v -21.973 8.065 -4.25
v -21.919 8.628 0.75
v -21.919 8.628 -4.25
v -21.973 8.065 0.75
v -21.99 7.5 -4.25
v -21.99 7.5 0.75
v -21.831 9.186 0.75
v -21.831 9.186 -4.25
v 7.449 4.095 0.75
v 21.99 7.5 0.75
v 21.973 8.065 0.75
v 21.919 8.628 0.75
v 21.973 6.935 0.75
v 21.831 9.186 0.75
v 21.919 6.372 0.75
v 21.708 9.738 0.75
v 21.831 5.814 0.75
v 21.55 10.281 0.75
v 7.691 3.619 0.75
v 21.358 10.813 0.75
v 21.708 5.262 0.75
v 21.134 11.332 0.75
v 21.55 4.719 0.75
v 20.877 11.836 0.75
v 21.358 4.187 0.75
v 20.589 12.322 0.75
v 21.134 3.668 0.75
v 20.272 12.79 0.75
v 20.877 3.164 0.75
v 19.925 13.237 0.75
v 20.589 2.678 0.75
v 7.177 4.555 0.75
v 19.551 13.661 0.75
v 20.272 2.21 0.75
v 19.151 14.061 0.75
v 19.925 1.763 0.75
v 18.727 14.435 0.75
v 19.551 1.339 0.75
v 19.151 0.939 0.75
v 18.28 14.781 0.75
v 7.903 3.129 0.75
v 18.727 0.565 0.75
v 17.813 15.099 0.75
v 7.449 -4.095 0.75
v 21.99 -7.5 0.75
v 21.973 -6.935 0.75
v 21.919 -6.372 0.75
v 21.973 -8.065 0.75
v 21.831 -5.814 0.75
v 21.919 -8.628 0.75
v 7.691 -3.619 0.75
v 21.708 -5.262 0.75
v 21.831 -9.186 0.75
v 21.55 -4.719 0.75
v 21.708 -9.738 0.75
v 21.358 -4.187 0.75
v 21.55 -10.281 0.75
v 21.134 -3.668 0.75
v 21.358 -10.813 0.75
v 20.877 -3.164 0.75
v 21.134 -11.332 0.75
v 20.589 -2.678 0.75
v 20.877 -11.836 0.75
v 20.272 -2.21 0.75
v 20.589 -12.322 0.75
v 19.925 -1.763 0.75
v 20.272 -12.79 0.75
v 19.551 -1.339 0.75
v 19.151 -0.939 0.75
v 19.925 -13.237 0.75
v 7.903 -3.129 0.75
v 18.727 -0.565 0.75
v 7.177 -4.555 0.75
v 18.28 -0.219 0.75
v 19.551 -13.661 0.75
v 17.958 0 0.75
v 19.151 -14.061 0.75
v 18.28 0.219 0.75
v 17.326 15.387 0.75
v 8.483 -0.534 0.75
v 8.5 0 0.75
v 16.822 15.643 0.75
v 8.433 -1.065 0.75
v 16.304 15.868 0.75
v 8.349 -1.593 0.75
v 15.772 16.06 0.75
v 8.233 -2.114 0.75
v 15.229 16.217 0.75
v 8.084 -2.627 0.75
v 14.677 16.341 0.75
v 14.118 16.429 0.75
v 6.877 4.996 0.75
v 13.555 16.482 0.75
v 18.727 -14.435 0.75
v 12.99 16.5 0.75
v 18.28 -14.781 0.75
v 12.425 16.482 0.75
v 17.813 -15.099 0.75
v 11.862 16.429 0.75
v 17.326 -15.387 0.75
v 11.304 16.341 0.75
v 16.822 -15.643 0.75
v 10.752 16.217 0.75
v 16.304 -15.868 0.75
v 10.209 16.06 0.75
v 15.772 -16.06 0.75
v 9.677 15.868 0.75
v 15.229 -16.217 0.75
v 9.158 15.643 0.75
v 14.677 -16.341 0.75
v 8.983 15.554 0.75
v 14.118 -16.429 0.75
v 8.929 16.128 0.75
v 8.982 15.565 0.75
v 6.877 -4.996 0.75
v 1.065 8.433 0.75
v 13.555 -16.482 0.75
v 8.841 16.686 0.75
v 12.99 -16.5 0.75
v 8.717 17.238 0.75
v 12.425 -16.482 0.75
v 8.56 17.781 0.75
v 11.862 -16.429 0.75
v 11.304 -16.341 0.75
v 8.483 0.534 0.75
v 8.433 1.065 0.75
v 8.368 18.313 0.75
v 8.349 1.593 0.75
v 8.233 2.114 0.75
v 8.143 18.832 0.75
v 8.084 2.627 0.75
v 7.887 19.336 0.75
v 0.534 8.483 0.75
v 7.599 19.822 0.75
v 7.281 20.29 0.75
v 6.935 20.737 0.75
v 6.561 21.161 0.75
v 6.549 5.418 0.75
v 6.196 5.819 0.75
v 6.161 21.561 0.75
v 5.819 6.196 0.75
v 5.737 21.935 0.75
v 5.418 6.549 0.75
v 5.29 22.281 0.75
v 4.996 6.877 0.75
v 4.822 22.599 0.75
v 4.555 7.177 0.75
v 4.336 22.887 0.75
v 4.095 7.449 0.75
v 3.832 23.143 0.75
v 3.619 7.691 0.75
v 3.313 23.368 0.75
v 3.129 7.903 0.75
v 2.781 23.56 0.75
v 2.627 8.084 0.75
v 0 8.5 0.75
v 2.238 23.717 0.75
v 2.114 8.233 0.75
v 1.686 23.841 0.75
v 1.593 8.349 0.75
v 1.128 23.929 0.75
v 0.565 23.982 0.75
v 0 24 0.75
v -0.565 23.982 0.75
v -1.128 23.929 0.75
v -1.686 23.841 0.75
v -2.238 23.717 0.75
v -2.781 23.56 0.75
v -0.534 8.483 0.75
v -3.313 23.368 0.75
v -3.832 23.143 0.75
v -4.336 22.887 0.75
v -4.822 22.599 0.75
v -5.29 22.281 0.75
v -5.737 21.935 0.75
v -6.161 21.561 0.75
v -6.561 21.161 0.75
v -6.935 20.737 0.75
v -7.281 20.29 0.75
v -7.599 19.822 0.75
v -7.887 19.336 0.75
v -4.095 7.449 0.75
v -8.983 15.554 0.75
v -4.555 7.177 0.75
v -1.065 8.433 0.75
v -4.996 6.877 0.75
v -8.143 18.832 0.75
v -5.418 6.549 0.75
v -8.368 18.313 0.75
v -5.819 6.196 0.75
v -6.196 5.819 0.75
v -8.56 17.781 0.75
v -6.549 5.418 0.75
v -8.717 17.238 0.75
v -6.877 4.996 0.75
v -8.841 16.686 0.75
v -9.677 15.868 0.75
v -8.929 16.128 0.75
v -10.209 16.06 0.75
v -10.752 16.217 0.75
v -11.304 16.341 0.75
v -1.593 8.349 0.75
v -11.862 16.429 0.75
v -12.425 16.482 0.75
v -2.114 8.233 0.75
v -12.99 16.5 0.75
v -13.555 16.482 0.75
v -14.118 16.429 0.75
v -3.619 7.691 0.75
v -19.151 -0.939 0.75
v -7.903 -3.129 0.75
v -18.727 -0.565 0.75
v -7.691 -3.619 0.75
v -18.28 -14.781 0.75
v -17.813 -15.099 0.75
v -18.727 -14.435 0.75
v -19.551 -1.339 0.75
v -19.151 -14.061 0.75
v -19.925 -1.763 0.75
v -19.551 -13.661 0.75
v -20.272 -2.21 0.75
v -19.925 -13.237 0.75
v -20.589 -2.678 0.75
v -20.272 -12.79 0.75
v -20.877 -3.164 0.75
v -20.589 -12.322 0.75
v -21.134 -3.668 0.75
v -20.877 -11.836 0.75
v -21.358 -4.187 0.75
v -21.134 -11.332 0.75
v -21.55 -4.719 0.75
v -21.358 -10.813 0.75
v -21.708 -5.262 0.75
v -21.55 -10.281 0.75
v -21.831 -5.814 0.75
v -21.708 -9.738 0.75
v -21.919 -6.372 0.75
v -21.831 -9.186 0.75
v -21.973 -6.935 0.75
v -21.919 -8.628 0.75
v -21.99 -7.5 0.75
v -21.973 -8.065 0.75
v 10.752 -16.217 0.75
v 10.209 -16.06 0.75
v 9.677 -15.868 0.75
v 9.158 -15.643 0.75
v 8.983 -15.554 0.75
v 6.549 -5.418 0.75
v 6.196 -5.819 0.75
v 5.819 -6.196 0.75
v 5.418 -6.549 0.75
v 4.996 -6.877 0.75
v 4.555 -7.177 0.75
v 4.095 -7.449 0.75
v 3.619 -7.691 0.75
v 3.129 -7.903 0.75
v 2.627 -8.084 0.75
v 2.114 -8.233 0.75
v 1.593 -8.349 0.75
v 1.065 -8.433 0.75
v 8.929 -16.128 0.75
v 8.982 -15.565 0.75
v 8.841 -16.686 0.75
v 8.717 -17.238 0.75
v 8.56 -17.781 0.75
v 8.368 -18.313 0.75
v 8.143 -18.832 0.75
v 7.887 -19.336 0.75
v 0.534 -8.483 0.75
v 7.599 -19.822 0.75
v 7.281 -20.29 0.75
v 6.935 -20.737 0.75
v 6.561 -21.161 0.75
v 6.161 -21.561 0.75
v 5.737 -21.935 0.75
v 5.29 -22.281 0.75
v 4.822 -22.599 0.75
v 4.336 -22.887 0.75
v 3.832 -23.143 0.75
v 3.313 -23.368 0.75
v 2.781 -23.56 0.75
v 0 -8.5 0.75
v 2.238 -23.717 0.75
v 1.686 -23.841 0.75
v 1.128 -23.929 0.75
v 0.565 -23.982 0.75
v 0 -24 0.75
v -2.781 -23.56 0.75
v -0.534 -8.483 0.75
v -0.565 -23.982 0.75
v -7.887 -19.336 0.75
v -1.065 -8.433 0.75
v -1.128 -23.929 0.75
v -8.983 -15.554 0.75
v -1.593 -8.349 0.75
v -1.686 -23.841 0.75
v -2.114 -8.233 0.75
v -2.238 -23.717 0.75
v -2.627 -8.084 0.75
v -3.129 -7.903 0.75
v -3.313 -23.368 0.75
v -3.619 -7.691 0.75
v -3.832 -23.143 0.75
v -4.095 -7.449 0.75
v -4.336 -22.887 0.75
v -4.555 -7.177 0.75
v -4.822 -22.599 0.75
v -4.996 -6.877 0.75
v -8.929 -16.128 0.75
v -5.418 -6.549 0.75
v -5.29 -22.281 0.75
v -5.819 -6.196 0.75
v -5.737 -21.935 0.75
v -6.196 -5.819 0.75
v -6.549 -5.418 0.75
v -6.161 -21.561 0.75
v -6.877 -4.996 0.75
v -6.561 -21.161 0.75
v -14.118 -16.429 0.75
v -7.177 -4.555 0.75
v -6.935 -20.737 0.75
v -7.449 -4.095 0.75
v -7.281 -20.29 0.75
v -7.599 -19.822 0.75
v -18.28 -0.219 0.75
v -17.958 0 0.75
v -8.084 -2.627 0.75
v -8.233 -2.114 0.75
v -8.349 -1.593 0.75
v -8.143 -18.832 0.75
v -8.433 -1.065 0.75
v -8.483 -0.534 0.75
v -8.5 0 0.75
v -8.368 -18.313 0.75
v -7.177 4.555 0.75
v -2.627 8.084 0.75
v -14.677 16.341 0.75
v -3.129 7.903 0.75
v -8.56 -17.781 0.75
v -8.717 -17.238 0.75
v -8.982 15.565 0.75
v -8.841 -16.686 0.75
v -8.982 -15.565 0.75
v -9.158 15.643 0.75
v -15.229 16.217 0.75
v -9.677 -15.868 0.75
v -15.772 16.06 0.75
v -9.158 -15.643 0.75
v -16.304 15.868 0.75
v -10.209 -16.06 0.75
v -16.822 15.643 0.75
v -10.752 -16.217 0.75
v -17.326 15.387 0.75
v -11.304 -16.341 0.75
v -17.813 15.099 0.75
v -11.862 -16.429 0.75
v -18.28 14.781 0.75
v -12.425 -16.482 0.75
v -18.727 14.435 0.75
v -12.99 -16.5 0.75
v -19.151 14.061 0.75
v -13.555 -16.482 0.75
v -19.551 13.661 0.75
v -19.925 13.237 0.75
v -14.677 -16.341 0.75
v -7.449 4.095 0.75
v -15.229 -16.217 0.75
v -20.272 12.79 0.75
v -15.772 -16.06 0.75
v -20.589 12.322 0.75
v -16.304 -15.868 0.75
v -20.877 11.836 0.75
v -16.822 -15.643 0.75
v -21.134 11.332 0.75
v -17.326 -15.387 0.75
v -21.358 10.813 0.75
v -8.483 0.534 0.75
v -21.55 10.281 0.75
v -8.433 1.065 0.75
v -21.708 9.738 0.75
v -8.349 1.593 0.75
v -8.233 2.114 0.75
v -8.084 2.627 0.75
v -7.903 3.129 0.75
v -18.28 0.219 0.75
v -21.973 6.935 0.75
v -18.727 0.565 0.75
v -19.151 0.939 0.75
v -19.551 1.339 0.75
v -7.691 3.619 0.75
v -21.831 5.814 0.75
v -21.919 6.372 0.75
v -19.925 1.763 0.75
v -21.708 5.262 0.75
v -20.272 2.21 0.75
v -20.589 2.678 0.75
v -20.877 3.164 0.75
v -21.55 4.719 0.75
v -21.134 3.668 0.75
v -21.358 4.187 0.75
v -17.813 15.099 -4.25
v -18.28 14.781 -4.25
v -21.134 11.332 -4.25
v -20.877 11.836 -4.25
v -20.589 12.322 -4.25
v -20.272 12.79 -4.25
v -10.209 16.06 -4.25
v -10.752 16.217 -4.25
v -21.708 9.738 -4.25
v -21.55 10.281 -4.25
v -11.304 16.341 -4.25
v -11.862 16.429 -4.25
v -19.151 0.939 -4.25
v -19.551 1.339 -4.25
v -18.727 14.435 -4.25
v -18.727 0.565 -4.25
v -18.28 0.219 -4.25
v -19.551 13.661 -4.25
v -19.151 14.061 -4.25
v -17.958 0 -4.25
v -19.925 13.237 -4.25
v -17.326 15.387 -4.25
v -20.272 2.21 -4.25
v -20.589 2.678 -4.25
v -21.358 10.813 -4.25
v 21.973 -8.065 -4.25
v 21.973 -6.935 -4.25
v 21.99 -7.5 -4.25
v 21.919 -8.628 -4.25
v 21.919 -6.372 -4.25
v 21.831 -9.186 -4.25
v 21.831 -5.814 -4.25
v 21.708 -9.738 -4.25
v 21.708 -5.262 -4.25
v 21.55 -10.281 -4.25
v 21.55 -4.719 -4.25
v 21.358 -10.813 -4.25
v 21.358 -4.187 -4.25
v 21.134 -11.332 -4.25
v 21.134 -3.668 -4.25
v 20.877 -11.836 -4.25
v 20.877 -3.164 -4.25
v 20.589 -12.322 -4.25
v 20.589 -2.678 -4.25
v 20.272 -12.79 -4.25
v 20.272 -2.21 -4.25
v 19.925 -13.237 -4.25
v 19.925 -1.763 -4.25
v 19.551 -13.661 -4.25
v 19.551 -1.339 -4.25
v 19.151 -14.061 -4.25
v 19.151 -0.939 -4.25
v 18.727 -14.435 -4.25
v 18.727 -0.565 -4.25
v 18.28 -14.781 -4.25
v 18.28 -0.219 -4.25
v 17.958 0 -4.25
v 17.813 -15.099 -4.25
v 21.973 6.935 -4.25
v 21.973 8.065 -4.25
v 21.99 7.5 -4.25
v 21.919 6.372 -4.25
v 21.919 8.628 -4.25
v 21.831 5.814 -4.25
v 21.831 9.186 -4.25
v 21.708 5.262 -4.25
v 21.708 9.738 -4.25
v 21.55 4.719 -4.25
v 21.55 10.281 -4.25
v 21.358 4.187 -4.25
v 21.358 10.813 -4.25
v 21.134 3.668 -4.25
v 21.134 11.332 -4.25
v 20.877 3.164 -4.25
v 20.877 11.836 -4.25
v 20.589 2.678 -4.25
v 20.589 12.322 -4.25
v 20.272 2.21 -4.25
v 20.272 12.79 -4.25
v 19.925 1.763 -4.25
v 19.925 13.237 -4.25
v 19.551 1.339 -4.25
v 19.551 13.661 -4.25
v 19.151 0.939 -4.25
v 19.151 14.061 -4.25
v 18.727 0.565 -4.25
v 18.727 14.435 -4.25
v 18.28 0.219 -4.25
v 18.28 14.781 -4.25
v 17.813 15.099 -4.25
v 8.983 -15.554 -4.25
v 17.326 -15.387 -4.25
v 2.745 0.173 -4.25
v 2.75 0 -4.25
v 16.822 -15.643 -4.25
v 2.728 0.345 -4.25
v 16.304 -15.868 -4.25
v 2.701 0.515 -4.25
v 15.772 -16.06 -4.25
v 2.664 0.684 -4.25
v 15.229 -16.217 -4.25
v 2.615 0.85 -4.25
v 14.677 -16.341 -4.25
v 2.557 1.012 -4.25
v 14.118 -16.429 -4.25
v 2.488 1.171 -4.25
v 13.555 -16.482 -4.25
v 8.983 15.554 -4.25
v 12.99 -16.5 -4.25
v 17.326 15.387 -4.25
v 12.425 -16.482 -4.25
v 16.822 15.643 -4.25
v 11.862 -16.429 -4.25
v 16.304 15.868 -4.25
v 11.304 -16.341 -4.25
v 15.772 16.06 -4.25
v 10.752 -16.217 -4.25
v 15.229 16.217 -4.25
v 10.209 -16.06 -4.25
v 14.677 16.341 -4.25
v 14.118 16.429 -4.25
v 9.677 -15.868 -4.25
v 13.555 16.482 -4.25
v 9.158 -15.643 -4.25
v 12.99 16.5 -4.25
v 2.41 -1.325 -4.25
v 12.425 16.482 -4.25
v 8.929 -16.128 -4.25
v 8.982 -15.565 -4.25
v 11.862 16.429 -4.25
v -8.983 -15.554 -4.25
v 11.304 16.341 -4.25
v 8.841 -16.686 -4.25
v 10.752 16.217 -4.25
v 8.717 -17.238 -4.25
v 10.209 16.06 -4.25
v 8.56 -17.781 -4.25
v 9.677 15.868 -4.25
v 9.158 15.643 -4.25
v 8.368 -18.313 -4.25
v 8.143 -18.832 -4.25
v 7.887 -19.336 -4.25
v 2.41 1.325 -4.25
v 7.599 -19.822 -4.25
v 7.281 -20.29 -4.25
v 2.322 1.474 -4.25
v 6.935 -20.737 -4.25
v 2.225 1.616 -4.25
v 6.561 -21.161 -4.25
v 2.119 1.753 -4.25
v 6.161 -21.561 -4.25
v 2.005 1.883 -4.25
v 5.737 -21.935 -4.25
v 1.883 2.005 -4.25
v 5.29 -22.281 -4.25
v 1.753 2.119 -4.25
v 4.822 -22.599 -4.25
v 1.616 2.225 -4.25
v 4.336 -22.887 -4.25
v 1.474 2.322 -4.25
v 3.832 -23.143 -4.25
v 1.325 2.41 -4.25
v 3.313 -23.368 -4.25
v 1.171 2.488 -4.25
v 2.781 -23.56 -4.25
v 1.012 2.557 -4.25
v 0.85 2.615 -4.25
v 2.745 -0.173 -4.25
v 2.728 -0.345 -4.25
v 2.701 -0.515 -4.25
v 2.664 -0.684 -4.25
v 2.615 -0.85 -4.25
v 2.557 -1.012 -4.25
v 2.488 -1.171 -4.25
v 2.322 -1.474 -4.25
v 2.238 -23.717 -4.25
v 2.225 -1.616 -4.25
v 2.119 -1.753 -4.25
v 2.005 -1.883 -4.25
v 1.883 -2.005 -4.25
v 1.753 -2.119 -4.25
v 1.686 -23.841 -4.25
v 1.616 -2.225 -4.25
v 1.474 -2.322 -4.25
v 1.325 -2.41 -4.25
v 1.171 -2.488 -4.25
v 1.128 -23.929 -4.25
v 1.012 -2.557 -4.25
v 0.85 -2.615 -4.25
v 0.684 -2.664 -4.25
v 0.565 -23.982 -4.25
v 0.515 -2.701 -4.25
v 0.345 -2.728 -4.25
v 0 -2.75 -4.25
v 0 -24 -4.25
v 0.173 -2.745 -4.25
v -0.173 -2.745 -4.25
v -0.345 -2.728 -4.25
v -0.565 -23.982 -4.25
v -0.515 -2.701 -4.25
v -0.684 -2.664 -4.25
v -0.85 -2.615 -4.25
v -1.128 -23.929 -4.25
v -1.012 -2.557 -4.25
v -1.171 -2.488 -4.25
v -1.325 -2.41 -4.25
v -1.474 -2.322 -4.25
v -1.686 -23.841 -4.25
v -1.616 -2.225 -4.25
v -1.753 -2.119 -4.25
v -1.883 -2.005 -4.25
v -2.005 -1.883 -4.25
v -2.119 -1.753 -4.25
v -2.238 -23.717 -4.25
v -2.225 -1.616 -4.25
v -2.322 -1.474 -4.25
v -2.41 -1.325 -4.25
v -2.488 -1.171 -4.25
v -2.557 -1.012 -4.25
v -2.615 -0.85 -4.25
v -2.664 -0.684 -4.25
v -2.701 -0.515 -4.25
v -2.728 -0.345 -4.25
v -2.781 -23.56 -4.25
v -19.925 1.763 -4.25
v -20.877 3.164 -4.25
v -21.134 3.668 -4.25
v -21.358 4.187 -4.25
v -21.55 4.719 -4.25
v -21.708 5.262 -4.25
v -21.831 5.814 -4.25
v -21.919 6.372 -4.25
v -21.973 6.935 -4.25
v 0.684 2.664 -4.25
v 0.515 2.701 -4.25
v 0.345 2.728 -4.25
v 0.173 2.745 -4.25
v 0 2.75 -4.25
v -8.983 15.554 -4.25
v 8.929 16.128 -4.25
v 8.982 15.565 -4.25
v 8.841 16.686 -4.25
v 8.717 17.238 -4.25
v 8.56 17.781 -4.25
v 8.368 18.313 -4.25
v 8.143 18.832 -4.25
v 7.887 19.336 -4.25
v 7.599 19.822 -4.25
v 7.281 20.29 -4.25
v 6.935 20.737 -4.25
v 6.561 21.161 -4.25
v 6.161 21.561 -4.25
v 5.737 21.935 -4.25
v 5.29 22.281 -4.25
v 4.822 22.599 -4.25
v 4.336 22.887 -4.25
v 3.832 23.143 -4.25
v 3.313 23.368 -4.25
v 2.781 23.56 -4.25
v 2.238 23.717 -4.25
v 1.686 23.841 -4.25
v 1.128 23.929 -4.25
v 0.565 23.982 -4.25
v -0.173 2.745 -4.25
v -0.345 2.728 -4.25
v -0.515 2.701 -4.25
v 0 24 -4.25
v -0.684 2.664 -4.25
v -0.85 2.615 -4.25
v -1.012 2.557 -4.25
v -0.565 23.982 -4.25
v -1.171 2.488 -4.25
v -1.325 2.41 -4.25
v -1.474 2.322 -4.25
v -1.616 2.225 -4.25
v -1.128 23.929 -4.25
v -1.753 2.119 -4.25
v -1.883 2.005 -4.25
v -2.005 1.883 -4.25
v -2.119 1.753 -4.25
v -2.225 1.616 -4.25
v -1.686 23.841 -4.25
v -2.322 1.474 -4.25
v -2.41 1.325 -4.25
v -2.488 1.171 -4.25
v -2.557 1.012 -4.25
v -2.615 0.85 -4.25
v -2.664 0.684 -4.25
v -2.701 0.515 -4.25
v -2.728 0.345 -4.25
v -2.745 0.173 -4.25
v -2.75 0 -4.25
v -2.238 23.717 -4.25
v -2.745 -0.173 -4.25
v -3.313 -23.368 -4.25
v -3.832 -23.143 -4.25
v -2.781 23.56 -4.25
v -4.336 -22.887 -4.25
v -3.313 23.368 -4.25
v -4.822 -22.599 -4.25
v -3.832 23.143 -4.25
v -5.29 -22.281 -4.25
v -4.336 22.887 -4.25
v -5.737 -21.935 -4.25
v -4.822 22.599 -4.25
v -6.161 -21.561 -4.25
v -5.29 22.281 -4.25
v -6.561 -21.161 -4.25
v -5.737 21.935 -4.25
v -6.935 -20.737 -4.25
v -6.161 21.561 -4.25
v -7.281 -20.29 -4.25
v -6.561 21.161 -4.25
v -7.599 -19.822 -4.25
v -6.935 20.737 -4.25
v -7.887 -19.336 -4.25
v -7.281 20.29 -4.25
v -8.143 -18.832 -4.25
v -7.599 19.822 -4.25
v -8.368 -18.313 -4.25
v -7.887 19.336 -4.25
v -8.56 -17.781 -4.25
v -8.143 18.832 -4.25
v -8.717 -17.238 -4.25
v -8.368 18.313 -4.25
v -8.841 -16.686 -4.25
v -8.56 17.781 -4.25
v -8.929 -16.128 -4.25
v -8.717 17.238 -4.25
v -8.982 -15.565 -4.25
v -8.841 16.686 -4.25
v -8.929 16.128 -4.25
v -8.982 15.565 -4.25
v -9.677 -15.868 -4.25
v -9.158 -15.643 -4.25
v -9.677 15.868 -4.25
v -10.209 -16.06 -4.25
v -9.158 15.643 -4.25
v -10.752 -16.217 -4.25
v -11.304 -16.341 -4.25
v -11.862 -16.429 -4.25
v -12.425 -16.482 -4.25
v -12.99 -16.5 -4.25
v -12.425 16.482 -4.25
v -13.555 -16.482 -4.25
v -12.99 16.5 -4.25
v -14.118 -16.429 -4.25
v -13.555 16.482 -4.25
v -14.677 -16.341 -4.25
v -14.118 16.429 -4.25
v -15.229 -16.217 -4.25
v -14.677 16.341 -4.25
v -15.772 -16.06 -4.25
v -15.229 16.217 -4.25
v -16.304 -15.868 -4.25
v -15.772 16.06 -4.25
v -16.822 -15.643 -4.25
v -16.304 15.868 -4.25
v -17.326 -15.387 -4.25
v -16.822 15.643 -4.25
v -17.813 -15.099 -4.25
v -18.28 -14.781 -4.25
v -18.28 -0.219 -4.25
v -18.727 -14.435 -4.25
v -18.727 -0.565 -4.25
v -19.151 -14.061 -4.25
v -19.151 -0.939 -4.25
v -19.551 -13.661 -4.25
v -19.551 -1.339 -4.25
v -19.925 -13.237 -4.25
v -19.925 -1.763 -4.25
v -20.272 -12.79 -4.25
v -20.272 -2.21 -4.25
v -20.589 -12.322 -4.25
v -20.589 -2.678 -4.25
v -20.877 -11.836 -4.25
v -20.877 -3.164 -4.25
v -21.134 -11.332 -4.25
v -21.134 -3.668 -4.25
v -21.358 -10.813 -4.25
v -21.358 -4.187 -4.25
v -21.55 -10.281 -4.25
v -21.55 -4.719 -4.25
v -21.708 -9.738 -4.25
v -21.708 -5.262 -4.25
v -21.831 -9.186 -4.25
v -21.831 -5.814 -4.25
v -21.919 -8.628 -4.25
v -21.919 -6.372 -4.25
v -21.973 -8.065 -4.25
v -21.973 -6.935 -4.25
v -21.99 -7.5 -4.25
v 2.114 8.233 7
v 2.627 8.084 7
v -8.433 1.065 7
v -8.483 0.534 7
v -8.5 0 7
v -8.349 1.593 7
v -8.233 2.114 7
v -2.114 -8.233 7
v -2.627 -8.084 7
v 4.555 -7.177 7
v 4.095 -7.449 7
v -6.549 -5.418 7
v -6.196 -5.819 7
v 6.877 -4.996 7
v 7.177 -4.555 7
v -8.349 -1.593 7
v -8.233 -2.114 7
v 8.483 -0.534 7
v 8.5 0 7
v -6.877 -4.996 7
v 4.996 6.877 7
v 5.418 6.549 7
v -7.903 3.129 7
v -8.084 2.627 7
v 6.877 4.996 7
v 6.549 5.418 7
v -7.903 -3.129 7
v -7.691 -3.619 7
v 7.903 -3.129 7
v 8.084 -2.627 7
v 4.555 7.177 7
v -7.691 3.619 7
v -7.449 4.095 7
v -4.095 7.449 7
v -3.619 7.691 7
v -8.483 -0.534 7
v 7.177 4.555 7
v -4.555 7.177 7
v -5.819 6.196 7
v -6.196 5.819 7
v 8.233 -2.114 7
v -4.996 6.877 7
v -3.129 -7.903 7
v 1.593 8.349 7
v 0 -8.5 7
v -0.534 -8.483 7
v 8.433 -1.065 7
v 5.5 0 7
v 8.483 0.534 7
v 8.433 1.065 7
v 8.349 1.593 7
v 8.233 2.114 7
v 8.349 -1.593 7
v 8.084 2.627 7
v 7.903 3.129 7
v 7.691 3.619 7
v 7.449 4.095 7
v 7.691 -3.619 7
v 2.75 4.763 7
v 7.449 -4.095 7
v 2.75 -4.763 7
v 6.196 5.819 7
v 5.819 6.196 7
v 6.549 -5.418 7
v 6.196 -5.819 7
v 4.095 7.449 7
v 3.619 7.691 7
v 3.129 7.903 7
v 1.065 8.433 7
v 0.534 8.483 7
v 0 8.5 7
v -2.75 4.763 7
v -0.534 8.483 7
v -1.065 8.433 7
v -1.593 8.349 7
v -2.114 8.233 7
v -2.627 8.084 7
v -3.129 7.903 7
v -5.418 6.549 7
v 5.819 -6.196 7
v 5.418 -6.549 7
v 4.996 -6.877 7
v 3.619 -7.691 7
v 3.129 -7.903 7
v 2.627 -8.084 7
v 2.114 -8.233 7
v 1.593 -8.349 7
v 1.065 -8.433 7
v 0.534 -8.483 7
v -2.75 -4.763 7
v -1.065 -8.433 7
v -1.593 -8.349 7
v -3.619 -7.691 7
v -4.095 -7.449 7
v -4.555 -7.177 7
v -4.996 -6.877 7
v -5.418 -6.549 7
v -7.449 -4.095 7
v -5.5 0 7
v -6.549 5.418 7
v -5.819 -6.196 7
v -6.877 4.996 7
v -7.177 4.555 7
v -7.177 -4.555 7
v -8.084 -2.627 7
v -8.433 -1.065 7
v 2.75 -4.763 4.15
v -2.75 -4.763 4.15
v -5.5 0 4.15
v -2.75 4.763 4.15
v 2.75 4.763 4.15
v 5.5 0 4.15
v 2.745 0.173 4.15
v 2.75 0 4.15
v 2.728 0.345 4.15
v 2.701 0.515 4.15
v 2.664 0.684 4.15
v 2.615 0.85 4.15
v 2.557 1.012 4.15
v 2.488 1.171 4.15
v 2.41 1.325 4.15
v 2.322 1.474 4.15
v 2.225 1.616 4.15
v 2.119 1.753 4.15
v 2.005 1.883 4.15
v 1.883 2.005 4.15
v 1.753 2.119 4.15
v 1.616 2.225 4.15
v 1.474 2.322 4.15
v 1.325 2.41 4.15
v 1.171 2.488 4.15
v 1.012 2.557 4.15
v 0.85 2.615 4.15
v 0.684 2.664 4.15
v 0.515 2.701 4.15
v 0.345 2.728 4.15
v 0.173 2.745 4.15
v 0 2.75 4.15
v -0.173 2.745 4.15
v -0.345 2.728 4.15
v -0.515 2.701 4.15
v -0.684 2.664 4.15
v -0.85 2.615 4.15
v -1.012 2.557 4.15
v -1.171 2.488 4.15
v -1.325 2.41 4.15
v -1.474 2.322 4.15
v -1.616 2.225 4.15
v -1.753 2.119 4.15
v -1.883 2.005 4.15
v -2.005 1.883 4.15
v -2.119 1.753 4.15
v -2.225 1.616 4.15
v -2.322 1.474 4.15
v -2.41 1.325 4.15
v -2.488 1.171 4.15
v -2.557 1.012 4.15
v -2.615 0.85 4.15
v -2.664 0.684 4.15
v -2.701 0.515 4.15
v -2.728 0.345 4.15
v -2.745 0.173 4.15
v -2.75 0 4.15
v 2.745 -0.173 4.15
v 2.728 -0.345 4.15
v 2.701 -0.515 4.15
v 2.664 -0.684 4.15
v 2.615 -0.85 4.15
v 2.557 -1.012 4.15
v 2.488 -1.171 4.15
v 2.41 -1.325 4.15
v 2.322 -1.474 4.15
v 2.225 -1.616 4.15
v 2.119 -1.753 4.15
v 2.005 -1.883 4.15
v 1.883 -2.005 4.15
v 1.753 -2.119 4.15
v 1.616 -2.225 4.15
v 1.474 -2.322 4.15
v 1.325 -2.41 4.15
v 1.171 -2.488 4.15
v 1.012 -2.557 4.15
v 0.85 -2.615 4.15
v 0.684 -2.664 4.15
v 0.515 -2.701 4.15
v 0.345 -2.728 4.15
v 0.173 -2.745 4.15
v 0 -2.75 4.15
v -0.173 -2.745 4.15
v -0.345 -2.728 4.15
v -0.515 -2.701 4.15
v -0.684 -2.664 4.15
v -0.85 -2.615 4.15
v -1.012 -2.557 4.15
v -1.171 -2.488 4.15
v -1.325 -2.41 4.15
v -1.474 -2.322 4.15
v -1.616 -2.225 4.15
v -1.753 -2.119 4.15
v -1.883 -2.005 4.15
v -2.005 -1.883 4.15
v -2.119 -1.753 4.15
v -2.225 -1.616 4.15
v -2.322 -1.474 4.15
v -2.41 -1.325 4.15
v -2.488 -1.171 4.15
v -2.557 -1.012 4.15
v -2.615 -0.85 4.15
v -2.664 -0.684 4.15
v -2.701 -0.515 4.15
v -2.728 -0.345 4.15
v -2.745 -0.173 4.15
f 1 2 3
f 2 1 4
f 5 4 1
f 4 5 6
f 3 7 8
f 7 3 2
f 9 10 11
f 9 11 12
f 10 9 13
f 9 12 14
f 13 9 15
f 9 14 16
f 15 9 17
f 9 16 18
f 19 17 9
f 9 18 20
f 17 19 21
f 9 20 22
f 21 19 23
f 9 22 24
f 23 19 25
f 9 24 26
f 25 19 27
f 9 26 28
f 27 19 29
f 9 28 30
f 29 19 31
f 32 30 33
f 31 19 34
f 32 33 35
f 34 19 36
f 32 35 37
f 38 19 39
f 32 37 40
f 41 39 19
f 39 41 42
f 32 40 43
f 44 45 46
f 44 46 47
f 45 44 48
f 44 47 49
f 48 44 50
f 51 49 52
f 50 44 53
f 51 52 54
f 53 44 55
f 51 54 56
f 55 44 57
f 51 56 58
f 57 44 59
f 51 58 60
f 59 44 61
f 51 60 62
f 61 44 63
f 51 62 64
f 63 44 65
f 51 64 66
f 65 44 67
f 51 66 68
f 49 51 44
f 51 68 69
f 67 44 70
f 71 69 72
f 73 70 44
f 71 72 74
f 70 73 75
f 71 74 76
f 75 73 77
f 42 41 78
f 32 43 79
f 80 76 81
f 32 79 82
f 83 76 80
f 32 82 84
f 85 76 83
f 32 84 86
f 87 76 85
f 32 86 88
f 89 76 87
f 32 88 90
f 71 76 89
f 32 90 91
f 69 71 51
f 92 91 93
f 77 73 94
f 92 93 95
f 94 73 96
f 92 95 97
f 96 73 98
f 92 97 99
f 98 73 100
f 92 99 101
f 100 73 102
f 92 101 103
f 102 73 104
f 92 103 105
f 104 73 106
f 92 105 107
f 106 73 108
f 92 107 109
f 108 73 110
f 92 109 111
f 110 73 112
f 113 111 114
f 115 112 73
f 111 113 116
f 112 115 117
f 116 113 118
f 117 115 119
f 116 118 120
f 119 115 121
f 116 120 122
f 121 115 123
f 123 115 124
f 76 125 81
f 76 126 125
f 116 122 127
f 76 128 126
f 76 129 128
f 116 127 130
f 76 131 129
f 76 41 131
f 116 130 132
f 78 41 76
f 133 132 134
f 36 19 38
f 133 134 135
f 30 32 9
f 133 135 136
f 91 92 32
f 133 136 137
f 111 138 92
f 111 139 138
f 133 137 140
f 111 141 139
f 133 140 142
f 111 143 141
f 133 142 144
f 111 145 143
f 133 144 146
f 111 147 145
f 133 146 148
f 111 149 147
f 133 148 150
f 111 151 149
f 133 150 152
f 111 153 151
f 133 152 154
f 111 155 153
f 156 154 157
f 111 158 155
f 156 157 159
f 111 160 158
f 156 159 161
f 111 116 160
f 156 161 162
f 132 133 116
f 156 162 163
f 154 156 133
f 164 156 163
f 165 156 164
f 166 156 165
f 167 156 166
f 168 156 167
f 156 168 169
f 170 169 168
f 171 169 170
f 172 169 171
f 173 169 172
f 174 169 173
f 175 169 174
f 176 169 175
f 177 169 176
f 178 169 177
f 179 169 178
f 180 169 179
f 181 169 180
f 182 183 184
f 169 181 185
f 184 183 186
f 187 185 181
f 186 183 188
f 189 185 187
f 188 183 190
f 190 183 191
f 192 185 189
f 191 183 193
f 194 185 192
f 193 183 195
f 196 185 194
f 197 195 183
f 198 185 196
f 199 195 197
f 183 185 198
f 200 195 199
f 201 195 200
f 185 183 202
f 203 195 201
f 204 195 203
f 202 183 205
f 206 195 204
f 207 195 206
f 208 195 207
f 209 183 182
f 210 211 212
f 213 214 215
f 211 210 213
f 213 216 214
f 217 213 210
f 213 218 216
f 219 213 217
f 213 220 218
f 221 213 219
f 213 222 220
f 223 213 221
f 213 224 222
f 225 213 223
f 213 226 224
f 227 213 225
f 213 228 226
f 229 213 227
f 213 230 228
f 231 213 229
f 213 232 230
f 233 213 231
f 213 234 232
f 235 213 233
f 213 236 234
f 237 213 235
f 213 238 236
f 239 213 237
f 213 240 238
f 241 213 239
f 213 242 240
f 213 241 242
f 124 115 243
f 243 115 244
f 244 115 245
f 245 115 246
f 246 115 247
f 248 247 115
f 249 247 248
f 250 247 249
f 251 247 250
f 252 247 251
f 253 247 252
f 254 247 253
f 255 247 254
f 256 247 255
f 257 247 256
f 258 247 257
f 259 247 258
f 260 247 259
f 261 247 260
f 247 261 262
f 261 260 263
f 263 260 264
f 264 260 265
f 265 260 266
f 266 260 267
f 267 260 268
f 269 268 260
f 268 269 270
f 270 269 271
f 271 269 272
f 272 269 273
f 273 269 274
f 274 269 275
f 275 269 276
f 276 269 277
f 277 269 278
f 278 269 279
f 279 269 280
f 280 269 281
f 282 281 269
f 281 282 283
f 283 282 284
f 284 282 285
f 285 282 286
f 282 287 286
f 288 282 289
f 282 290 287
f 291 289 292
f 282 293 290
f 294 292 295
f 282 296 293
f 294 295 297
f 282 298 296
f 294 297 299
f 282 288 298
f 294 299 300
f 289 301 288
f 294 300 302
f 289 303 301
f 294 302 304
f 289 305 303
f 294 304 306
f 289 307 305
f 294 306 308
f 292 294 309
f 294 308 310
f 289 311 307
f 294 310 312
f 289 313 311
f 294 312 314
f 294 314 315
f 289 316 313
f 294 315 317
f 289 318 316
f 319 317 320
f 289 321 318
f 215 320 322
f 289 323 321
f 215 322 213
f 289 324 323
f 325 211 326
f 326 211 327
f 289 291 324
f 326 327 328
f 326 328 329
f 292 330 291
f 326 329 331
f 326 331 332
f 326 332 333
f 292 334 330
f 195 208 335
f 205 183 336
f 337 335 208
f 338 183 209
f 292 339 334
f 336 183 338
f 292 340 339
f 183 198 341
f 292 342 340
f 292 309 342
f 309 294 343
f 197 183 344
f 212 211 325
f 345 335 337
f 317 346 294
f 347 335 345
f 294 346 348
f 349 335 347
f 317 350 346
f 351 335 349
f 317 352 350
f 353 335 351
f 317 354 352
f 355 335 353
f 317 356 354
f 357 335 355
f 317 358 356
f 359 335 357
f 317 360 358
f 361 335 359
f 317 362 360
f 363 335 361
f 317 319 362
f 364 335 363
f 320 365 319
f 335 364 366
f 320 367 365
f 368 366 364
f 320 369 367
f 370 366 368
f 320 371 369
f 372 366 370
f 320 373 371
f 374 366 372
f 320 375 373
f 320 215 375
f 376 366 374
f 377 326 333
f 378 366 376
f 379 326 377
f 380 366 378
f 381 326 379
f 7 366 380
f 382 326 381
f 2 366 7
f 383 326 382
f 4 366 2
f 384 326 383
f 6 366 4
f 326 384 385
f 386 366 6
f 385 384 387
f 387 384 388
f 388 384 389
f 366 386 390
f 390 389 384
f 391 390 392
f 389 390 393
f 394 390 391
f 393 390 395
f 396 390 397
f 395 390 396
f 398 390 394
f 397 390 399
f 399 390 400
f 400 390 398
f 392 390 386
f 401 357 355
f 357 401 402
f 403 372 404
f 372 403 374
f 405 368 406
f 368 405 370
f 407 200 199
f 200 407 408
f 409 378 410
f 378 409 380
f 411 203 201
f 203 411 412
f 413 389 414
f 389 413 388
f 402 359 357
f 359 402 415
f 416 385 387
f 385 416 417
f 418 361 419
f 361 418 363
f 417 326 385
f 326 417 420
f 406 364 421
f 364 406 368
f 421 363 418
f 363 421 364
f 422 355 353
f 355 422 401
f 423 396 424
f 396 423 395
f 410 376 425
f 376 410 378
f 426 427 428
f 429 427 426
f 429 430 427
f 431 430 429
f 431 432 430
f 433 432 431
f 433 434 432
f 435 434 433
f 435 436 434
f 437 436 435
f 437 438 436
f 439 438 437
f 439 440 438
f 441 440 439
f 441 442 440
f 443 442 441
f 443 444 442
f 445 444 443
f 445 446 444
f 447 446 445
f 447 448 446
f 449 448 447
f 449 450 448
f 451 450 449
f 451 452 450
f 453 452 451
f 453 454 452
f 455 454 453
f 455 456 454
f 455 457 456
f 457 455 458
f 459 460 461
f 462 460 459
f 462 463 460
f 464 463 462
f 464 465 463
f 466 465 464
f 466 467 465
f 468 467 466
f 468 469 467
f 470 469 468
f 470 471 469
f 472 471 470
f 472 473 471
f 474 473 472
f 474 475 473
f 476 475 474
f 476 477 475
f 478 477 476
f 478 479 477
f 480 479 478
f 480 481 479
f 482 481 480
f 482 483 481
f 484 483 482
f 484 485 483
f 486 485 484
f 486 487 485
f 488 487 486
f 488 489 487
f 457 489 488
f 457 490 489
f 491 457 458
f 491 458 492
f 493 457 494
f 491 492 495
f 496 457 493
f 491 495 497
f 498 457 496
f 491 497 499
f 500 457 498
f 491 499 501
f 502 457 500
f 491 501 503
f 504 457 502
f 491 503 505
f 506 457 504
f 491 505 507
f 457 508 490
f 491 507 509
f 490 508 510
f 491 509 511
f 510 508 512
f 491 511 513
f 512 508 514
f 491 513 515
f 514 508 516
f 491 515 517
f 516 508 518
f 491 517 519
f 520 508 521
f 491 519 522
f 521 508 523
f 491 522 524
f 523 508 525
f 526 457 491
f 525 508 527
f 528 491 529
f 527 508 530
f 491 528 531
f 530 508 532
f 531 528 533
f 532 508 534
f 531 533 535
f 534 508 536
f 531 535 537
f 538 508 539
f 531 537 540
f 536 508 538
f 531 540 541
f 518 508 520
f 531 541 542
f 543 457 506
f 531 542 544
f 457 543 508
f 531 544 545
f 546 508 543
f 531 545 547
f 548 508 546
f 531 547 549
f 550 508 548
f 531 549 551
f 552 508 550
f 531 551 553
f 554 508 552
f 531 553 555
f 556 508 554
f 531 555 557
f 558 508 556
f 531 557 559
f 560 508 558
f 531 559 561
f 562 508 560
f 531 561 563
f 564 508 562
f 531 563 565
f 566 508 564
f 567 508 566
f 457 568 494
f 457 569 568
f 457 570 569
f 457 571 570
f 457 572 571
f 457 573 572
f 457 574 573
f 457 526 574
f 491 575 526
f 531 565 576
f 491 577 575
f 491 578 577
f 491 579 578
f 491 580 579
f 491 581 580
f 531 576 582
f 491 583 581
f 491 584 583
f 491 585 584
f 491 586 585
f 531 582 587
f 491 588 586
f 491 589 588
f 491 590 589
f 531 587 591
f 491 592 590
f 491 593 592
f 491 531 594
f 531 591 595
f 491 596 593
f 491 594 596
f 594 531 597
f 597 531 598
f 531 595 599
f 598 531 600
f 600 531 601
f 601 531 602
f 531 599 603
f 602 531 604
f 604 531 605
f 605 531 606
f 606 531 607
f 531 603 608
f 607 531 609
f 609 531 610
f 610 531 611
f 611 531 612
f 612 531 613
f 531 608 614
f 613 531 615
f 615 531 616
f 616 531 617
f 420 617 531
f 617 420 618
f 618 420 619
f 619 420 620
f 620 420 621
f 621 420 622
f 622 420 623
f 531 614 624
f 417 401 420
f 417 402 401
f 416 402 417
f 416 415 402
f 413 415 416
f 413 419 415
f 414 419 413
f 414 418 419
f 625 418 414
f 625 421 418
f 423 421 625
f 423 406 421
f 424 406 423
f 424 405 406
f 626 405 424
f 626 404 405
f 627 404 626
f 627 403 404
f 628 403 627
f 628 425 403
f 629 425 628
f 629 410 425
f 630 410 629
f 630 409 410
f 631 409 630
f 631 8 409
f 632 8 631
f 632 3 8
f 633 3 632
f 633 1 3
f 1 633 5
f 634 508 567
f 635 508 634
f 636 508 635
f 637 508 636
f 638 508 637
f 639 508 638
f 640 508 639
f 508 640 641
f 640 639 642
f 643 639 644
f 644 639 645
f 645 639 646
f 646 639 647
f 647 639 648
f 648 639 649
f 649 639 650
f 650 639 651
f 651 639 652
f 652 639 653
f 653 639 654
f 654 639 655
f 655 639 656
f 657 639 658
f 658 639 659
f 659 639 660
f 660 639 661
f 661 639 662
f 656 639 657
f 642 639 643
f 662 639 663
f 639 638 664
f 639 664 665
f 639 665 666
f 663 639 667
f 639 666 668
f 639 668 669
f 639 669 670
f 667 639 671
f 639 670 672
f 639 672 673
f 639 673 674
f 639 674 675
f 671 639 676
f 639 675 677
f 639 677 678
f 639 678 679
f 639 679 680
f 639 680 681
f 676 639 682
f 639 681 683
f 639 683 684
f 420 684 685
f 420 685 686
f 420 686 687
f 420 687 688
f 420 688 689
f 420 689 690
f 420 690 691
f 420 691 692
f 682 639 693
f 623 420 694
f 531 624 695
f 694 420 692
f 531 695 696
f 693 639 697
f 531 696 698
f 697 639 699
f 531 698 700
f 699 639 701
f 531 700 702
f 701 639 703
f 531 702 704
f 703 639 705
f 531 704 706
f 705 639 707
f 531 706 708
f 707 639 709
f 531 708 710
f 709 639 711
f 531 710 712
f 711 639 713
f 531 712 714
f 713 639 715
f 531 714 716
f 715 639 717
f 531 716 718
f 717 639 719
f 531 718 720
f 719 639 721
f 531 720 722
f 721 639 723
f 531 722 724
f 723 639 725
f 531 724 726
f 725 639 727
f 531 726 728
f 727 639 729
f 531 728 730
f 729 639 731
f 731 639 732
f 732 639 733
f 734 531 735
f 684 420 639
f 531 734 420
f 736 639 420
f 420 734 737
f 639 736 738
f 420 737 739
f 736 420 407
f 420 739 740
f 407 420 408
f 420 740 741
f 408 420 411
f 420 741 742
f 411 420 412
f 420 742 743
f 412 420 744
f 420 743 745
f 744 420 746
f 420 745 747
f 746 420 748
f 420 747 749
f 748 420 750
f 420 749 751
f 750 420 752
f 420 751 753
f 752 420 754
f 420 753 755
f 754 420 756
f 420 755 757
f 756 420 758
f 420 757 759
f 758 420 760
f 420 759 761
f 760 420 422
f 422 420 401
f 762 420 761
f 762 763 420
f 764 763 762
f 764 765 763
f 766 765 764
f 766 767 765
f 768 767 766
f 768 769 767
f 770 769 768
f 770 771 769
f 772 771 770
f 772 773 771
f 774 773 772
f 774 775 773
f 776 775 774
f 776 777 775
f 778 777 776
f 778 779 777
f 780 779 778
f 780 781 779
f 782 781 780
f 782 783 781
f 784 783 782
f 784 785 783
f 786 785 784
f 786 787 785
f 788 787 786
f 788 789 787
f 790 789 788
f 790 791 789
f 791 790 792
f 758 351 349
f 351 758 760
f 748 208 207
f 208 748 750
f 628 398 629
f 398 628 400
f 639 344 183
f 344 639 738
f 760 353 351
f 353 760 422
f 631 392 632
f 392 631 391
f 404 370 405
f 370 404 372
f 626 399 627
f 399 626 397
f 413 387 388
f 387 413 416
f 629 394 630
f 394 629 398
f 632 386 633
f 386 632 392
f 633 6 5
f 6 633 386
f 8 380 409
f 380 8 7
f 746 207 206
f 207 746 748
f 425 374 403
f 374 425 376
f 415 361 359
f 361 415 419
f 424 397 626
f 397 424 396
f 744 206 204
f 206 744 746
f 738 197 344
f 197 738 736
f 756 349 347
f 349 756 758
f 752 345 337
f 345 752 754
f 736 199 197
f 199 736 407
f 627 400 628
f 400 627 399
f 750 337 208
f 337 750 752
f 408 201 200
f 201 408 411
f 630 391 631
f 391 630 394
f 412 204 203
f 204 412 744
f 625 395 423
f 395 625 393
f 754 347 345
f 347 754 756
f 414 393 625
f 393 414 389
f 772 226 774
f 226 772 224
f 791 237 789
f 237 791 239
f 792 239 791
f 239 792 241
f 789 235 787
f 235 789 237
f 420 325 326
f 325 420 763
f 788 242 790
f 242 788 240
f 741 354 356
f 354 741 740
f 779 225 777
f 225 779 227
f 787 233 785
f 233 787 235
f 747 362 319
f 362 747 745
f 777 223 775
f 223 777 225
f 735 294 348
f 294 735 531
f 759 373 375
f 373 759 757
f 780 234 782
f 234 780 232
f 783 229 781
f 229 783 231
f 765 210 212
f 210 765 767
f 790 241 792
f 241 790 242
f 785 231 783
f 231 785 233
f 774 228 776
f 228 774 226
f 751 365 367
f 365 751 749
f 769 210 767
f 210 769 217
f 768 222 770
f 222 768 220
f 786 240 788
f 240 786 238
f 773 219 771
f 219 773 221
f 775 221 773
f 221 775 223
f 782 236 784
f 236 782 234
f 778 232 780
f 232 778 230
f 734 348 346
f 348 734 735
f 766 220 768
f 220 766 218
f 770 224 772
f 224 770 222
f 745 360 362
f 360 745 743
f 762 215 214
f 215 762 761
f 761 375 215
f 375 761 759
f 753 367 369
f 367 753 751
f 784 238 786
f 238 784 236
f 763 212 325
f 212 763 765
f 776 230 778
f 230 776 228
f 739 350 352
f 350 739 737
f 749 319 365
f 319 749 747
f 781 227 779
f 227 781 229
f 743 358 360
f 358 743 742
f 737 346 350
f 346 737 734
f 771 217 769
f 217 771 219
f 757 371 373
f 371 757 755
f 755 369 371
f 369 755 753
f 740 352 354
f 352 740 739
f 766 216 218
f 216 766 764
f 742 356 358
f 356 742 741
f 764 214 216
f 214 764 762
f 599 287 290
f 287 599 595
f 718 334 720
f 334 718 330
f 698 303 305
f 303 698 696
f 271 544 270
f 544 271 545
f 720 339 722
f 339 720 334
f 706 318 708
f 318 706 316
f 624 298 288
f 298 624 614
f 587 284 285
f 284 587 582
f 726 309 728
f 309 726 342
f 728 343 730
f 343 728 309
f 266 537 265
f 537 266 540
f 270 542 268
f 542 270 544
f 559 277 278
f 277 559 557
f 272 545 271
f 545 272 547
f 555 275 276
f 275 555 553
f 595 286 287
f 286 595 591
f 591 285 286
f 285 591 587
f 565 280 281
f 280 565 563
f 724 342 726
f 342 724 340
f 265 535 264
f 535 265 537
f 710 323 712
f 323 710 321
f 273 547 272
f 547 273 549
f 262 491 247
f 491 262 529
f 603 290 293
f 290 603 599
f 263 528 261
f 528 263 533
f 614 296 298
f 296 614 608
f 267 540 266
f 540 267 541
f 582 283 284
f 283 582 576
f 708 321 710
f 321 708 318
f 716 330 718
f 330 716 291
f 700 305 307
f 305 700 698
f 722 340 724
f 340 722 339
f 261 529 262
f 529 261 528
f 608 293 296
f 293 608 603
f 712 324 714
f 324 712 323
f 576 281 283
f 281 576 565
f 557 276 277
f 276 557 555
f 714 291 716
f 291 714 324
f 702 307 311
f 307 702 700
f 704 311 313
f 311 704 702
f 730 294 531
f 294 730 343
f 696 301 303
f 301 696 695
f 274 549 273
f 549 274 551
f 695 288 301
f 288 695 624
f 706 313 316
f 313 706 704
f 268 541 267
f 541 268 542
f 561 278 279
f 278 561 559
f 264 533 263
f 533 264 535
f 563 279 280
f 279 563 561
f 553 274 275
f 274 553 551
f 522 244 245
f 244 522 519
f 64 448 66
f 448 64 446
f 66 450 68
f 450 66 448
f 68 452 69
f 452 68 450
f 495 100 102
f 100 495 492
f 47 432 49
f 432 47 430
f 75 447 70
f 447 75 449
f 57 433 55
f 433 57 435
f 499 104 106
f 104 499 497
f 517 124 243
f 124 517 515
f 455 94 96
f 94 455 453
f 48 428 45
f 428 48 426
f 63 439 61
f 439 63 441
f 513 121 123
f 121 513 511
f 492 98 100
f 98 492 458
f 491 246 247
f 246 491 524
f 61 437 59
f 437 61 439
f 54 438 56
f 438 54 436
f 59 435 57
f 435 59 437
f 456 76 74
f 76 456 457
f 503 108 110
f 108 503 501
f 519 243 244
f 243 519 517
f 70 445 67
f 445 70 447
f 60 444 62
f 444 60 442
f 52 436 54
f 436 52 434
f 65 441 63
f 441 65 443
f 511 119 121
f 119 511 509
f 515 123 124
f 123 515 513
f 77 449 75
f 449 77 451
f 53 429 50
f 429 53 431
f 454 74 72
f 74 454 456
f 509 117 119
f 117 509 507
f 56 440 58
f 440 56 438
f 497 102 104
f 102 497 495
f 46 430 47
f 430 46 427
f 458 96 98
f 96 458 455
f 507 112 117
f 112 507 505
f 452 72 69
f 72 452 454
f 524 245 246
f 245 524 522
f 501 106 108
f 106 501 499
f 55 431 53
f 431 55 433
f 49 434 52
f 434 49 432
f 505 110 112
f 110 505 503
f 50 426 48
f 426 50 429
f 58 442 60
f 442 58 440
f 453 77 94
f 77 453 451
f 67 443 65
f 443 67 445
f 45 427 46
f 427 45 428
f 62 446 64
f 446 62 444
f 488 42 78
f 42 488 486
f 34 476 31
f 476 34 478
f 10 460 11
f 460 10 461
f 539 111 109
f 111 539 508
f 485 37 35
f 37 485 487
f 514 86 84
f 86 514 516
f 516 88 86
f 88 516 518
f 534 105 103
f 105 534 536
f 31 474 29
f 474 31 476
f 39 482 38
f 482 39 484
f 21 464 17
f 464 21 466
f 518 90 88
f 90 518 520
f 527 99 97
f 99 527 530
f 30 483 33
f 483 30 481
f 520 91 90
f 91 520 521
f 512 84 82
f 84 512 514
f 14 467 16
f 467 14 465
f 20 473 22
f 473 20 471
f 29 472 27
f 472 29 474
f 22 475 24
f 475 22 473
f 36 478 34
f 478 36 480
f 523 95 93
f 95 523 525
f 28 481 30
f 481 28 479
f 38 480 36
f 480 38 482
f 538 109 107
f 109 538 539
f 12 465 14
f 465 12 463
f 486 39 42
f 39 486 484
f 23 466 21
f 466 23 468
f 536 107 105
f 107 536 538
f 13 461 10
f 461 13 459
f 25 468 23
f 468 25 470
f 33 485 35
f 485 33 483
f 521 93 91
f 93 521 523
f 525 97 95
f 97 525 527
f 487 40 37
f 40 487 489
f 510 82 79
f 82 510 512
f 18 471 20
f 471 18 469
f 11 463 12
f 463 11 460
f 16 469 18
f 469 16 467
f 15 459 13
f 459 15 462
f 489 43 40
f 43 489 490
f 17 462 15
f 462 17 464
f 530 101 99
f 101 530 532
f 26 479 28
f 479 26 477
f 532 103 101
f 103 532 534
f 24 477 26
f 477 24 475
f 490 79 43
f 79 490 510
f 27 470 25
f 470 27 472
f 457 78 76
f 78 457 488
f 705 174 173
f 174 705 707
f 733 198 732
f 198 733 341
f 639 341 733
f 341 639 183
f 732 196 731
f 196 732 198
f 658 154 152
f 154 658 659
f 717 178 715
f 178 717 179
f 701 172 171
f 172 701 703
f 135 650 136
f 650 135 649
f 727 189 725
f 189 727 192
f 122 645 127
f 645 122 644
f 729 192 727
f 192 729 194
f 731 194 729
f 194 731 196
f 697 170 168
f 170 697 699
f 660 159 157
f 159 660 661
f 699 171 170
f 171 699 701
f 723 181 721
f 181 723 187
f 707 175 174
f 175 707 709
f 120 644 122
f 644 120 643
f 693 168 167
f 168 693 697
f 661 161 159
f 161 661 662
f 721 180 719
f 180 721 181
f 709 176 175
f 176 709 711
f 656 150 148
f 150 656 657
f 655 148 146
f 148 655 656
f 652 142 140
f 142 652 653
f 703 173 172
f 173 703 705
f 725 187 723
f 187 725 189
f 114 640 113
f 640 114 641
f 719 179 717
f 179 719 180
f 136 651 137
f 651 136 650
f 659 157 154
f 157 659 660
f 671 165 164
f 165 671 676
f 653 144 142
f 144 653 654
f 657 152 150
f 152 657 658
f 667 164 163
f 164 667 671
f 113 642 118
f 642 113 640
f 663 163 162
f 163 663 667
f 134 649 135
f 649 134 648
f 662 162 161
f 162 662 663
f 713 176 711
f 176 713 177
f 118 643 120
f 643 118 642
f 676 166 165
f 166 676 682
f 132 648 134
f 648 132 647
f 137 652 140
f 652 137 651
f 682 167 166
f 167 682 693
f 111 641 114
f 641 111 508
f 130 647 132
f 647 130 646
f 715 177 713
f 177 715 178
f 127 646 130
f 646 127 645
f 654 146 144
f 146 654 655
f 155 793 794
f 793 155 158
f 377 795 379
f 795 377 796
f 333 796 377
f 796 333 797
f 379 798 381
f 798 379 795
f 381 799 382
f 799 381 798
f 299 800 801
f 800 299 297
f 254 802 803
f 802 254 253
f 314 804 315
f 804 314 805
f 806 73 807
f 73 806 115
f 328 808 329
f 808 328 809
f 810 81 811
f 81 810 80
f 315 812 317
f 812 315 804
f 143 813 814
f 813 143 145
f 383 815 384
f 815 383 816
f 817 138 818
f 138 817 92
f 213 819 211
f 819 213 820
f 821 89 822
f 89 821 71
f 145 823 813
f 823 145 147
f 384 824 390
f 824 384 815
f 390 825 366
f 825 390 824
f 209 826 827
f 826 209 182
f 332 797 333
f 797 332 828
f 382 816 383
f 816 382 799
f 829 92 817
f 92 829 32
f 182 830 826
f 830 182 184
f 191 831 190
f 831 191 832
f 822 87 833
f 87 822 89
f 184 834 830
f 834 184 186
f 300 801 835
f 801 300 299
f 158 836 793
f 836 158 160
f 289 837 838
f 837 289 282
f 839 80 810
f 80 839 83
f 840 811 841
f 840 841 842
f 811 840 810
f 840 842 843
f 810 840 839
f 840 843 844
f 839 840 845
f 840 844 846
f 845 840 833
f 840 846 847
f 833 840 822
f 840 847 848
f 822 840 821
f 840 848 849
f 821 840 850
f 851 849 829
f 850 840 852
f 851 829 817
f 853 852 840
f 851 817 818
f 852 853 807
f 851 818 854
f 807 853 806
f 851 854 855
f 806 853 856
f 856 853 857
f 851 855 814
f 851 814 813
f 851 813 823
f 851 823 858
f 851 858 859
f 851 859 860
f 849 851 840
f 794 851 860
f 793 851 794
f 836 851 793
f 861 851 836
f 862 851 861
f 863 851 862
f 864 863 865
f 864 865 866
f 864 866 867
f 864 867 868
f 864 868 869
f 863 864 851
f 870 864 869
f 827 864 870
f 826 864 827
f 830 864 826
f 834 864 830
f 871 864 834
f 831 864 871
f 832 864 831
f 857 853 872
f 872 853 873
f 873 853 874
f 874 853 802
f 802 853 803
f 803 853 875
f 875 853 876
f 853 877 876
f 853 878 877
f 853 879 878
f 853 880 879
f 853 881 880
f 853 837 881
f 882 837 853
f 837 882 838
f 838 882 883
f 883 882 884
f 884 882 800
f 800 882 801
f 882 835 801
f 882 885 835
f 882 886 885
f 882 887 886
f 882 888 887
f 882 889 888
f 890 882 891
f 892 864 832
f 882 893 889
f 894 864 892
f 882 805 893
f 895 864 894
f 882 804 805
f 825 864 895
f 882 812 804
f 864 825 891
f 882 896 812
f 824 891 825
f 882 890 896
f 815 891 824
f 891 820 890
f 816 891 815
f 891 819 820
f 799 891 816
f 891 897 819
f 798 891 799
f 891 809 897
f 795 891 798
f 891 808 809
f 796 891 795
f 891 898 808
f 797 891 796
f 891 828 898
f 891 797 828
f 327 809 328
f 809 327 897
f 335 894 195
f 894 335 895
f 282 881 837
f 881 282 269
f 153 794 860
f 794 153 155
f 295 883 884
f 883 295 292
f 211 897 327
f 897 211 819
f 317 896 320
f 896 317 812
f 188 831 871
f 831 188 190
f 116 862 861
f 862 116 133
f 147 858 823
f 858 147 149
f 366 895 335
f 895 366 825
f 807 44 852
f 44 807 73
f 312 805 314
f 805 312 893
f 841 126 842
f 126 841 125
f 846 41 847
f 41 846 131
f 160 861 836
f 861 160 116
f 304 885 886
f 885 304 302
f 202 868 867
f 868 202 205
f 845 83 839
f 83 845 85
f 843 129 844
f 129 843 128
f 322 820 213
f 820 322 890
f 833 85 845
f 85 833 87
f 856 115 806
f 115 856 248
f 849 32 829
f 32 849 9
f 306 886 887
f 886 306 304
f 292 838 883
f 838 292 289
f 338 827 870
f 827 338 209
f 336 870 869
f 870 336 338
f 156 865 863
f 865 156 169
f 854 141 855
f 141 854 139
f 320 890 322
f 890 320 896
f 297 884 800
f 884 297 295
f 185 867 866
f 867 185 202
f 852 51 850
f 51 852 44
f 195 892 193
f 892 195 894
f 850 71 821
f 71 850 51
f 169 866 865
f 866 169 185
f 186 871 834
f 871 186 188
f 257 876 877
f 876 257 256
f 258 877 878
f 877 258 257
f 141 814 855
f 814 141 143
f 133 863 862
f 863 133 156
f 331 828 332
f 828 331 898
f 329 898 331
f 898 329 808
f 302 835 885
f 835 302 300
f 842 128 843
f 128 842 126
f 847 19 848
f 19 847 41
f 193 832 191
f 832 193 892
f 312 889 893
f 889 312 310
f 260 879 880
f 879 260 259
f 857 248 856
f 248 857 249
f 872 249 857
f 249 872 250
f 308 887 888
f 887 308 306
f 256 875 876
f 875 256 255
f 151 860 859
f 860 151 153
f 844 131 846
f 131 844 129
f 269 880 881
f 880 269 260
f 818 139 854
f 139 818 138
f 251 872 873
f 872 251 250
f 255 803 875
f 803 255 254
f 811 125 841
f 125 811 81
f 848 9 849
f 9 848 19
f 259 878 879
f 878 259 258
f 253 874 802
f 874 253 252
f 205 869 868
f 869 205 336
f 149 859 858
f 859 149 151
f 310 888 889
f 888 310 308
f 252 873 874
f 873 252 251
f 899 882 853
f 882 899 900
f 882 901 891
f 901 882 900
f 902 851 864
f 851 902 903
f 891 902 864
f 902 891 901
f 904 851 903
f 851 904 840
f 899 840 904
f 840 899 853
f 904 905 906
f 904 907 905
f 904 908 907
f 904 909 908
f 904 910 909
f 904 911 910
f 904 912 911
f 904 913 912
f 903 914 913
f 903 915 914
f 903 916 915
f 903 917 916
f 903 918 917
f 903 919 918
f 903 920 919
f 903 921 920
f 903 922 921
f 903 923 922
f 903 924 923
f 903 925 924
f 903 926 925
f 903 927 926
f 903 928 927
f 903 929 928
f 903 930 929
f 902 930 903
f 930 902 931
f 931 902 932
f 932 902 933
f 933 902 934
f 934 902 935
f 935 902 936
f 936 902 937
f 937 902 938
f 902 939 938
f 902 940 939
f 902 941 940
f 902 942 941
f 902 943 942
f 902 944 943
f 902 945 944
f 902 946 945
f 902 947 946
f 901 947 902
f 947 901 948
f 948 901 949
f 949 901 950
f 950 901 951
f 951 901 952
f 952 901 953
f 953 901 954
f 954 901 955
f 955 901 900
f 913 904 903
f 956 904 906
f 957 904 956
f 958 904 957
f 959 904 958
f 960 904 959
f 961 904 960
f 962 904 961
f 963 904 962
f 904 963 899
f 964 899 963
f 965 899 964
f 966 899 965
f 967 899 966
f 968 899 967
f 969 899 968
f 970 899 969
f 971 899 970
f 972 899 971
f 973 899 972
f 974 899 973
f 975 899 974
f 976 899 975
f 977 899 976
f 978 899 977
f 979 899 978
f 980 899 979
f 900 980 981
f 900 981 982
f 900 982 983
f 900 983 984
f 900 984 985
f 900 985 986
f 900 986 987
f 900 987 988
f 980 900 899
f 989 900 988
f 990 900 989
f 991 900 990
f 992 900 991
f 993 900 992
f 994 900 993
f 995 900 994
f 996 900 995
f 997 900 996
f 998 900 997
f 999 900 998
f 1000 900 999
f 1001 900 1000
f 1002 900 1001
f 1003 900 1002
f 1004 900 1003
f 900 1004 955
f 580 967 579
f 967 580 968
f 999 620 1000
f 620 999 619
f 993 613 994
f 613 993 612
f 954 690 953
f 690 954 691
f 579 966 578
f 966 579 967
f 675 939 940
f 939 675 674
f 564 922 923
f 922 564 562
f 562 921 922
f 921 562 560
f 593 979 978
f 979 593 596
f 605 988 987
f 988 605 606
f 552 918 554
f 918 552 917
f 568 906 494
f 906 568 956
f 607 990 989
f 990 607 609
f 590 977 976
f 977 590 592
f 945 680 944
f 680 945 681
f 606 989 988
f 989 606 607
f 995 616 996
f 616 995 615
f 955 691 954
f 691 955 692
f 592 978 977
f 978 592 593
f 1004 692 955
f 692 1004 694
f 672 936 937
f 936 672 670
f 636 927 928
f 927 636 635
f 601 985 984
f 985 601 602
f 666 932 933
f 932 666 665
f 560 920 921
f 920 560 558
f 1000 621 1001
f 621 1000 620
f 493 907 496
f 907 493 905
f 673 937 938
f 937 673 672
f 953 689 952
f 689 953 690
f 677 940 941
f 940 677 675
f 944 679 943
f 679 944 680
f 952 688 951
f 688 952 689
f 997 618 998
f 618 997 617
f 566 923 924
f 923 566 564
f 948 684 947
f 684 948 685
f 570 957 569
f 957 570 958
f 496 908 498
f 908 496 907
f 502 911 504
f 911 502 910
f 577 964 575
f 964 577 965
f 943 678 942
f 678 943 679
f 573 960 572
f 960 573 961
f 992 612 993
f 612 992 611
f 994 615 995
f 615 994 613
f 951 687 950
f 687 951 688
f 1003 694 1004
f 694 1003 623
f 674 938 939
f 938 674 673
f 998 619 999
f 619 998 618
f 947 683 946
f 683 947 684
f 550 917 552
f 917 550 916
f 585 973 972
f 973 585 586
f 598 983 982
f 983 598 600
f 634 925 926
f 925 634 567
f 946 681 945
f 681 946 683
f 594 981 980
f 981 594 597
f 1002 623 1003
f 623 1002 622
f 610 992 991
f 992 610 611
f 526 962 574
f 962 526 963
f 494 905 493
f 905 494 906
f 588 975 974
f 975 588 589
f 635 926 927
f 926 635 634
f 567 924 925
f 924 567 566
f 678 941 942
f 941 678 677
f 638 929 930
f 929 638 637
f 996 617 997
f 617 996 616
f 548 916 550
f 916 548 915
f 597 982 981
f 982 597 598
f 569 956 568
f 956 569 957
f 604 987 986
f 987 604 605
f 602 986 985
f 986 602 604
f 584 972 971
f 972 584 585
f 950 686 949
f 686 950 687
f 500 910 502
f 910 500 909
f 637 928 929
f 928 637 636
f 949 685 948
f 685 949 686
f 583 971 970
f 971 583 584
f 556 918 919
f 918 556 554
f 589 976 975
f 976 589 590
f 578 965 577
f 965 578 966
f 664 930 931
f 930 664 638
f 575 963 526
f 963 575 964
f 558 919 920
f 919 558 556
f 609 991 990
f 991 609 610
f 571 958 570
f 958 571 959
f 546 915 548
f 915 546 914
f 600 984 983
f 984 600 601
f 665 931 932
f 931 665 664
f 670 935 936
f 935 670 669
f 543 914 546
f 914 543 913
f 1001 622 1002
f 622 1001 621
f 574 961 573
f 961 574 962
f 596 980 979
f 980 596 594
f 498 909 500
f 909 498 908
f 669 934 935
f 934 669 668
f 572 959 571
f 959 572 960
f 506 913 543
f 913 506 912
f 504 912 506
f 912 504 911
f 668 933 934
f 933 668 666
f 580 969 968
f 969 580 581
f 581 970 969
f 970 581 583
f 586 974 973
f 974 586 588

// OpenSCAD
/*
 *
 * Copyright 2019 Tim Schaller
 * All rights reserved
 * Released under the GPL3
 * No claims are made as to the fitness and/or corectness of
 * this work. Use at your own risk. If you create useless things,
 * or if the parts fail it is on you NOT ME. As far as I know
 * this might make your printer burst into flames or print
 * little pink bunnies. You call. };->
 *
*/

// Part color when an image is rendered
part_color = "skyblue";

// Height of the nut in milimeters
nut_height = 3.5;

// Diameter of the nut in milimeters.
nut_diam = 11;

// Size of the hole for the bolt in mm. Add .5
bolt_hole = 5.5;

// Approxamatly 1/3 of the final knob diameter
knob_diam = 15;

/***************************************************************/

PART = "tension_knob";

/***************************************************************/

if (PART == "tension_knob") {
  color(part_color)
  rotate([0,180,0])
  tension_knob(
    nut_height = 3.5,
    nut_diam = 11,
    bolt_hole = 5.5,
    knob_diam = 15
  );
}

/***************************************************************/

/* ========================================================= */
/* MODULES                                                   */
/* ========================================================= */

module tension_knob(
  nut_height = 3.5,
  nut_diam = 11,
  bolt_hole = 5.5,
  knob_diam = 15,
) {

  difference(){
    union(){
      translate([0, 0, -(nut_height)]) cylinder(h=nut_height*2, d=nut_diam+6, $fn=100, center=true);
      translate([0, 0, nut_height/2]) cylinder(h=5, d=knob_diam*2, $fn=100, center=true);
      for ( i = [1:6] ) {
        x = sin(i*60) * knob_diam;
        y = cos(i*60) * knob_diam;
        translate([x, y, nut_height/2]) cylinder(h=5, d=knob_diam* 1.2, $fn=100, center=true);
      }
    }
    translate([0, 0, 1-(nut_height*2)]) cylinder(h=nut_height+0.2, d=nut_diam, $fn=6, center=true);
    translate([0, 0, 0]) cylinder(h=20, d=bolt_hole, $fn=100, center=true);
  }
}
